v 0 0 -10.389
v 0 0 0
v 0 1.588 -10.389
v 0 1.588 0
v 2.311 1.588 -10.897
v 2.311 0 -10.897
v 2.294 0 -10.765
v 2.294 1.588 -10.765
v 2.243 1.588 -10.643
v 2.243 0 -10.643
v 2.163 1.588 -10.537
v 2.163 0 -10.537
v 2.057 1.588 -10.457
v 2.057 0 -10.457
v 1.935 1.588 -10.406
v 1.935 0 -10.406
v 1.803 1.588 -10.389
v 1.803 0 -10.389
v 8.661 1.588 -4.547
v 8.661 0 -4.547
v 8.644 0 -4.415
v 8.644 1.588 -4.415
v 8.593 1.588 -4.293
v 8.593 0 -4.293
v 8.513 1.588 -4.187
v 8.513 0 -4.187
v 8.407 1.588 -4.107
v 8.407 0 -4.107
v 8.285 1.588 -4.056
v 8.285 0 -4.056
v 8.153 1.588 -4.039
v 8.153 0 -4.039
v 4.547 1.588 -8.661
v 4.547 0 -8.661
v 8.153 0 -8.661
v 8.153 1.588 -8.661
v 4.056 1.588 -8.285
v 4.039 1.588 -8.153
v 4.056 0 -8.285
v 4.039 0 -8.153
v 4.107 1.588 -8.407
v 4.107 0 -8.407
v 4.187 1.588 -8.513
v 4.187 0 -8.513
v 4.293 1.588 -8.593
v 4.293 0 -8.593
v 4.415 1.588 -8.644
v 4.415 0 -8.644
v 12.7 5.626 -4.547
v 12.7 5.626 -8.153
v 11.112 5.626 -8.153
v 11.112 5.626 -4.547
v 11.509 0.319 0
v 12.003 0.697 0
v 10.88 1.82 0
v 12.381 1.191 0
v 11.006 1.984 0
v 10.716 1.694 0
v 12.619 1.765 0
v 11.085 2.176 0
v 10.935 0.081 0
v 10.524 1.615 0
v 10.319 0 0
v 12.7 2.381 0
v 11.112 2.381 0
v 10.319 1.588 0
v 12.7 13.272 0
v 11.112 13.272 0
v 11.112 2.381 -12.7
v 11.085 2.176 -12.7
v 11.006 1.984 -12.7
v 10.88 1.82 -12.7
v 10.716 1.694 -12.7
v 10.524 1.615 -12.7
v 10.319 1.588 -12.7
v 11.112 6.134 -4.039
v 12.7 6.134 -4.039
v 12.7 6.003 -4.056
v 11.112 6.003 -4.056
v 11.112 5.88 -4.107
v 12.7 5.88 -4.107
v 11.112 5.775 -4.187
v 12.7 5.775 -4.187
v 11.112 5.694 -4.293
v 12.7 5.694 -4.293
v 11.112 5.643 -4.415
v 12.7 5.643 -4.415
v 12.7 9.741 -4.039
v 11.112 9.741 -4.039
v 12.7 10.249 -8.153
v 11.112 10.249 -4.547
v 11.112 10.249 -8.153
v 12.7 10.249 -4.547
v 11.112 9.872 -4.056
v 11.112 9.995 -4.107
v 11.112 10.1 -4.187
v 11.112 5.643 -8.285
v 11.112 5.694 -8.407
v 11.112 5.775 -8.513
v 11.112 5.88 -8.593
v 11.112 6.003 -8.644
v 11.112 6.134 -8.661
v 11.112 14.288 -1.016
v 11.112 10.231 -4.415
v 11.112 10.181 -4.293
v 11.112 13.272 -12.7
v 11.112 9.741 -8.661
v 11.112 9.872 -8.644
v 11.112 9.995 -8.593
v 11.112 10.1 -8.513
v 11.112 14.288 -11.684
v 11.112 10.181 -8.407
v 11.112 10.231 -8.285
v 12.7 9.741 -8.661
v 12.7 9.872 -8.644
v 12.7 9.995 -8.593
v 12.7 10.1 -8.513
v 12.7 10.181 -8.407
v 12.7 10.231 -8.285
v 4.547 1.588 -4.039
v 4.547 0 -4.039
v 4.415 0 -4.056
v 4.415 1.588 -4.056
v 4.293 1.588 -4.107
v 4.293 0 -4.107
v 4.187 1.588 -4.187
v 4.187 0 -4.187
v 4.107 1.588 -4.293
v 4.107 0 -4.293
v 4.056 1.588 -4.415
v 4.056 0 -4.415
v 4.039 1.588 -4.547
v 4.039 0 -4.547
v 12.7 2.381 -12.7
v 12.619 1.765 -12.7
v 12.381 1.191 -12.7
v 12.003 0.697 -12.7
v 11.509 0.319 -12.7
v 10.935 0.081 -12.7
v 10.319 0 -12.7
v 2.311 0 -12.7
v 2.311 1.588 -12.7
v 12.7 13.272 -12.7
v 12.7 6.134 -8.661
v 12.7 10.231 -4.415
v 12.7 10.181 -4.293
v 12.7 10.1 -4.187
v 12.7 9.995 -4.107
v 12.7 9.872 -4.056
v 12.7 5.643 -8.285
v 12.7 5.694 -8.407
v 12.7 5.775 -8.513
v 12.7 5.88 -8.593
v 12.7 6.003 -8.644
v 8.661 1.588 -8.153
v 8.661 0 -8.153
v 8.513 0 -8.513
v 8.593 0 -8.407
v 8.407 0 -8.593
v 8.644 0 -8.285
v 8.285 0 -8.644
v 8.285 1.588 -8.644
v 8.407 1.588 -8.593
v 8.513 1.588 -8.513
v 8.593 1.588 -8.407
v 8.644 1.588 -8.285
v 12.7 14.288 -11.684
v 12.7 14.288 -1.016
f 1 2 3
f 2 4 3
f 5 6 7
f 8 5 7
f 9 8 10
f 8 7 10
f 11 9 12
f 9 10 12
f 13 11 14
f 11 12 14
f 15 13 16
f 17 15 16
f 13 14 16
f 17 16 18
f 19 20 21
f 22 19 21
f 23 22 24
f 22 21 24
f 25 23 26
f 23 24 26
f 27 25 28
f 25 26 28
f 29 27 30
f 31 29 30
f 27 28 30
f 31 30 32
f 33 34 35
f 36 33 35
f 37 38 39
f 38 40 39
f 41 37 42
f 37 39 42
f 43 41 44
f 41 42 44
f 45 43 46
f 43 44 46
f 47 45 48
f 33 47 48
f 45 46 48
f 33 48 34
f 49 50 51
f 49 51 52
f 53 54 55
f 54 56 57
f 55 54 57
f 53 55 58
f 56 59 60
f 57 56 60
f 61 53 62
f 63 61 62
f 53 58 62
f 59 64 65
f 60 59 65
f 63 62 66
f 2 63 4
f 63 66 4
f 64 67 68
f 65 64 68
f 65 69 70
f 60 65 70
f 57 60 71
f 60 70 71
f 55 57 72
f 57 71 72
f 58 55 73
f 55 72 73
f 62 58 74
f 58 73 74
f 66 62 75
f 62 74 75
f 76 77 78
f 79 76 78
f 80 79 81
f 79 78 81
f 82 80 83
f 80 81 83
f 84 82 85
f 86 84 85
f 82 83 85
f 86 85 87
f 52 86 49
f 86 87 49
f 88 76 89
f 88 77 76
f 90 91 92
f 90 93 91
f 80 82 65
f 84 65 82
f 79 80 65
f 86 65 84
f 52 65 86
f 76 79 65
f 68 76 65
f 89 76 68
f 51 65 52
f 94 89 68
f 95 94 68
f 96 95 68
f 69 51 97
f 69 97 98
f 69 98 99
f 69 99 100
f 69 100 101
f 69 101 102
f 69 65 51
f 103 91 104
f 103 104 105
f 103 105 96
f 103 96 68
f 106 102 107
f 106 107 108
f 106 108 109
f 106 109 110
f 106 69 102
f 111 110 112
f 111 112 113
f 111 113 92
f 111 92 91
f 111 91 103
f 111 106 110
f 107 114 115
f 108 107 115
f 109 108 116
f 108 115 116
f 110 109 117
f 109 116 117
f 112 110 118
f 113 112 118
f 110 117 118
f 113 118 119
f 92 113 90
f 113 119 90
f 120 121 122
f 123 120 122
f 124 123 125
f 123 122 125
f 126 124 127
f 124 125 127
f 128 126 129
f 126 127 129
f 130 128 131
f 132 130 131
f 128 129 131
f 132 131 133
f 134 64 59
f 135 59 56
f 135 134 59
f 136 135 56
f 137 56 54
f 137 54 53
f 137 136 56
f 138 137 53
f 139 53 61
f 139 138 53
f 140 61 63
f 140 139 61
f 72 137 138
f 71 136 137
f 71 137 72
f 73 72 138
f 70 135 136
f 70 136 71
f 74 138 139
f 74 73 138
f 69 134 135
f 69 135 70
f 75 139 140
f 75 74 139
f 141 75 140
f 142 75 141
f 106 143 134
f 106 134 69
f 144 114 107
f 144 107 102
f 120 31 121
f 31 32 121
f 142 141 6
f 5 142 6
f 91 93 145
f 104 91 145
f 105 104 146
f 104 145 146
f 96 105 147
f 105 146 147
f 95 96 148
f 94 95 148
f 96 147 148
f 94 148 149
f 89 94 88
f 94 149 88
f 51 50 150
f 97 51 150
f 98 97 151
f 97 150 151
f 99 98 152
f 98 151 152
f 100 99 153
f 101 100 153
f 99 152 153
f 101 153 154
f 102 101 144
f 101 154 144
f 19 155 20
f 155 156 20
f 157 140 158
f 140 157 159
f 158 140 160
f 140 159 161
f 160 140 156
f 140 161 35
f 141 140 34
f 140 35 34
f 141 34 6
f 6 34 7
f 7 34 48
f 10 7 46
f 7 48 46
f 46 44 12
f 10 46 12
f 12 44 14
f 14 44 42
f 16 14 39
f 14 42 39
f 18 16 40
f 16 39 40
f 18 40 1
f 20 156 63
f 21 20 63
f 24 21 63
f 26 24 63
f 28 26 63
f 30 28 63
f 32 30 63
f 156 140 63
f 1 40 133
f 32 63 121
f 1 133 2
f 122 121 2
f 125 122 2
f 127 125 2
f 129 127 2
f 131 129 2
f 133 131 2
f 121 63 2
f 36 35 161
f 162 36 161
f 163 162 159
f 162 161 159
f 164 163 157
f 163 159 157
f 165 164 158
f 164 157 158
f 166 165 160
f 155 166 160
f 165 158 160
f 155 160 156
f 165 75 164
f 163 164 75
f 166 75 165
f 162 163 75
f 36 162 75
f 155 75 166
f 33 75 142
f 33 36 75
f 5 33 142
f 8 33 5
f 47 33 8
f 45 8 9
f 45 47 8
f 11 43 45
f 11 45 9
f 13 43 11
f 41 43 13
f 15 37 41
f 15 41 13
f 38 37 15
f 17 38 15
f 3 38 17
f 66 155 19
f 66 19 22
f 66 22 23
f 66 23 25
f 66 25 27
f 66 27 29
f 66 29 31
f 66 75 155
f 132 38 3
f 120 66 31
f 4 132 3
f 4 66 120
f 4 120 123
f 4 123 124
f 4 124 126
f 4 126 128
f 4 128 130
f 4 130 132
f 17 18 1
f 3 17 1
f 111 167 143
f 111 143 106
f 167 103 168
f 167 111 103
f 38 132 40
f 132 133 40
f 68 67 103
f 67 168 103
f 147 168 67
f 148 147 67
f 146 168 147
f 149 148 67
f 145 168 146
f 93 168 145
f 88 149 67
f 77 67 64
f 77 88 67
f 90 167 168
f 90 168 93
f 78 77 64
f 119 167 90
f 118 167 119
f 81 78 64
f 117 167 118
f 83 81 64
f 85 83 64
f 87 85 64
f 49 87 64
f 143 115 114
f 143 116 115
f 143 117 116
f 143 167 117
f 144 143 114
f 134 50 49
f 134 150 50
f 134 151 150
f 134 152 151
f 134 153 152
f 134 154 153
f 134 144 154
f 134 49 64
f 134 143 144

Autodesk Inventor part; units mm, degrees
ref_plane "YZ Plane" through (0, 0, 0) normal (1, 0, 0) x (0, 1, 0)
ref_plane "XZ Plane" through (0, 0, 0) normal (0, 1, 0) x (-1, 0, 0)
sketch "Sketch1" plane through (0, 0, 0) normal (0, 1, 0) x (-1, 0, 0)
  line L0 (-12.7, 0) -> (12.7, 0)
  line L1 (12.7, 0) -> (12.7, -12.7)
  line L2 (12.7, -12.7) -> (-12.7, -12.7)
  line L3 (-12.7, -12.7) -> (-12.7, 0)
  line L4 (12.7, 0) -> (-12.7, -12.7) construction
  point P0 (0, 0)
  point P1 (0, 0)
  dimension "d0" = 25.4
  dimension "d1" = 12.7
extrude "Plate1" add sketch "Sketch1" along normal blind 1.5875
sketch "Sketch2" plane through (11.1125, 0, -12.7) normal (1, 0, 0) x (0, 1, 0)
  line L0 (0, 12.7) -> (0, 0)
  line L1 (0, 0) -> (14.2875, 0)
  line L2 (14.2875, 0) -> (14.2875, 12.7)
  line L3 (14.2875, 12.7) -> (0, 12.7)
edge flange "Flanges" height 12.7 angle 90 thickness 1.5875 bend radius 0.7937 thickness toward (1, 0, 0) relief tear relief width 1.5875 relief depth 0.7937 corner gap 1.5875 corner form 0 edges at (12.7, 1.5875, -6.35) (-12.7, 1.5875, -6.35) wall of the first edge with corners at (11.1125, 0, 0) (11.1125, 0, -12.7) (11.1125, 14.2875, -12.7) (11.1125, 14.2875, 0)
bend "Bend1"
corner "Corner1"
sketch "Sketch3" plane through (12.7, 2.3812, -12.7) normal (1, 0, 0) x (0, 0, -1)
  line L0 (-8.1534, 7.8676) -> (-4.5466, 7.8676)
  line L1 (-4.0386, 7.3596) -> (-4.0386, 3.7528)
  line L2 (-4.5466, 3.2448) -> (-8.1534, 3.2448)
  line L3 (-8.6614, 3.7528) -> (-8.6614, 7.3596)
  arc A0 (-8.1534, 7.8676) -> (-8.6614, 7.3596) centre (-8.1534, 7.3596) ccw
  arc A1 (-4.0386, 7.3596) -> (-4.5466, 7.8676) centre (-4.5466, 7.3596) ccw
  arc A2 (-4.5466, 3.2448) -> (-4.0386, 3.7528) centre (-4.5466, 3.7528) ccw
  arc A3 (-8.6614, 3.7528) -> (-8.1534, 3.2448) centre (-8.1534, 3.7528) ccw
  line L4 (-12.7, 0) -> (-12.7, 11.9062) construction
  line L5 (-12.7, 11.9062) -> (0, 11.9062) construction
  line L6 (-8.1534, 7.3596) -> (-4.5466, 3.7528) construction
  point P0 (-12.7, -2.3813)
  point P1 (-4.0386, 3.2448)
  point P2 (-8.6614, 3.2448)
  point P3 (-6.35, 5.5562)
  dimension "d16" = 4.6228
  dimension "d17" = 0.508
  dimension "d20" = 6.35
  dimension "d21" = 6.35
extrude "Flange Stamp" cut sketch "Sketch3" against normal blind 1.5875
sketch "Sketch7" plane through (12.7, 2.3813, 0) normal (1, 0, 0) x (0, 0, -1)
  arc A0 (4.5466, 7.8676) -> (4.0386, 7.3596) centre (4.5466, 7.3596) ccw construction
  arc A1 (8.1534, 3.2448) -> (8.6614, 3.7528) centre (8.1534, 3.7528) ccw construction
  circle A2 centre (6.35, 5.5563) radius 2.1844
  line L0 (4.5466, 7.3596) -> (8.1534, 3.7528) construction
  point P0 (0, -2.3813)
  dimension "d46" = 4.3688
surface extrude "Flange Circle" sketch "Sketch7" against normal up to surface (1.5875 mm away) shown yes curves A2
ref_plane "Flange Pattern Plane" through (12.7, 7.9375, -4.5466) normal (0, 1, 0) x (1, 0, 0)
sketch "Flange Pattern Sketch" plane through (12.7, 7.9375, -4.5466) normal (0, 1, 0) x (1, 0, 0)
  line L0 (0, 3.6068) -> (0, 0) construction
  line L1 (-30.5786, -4.5466) -> (5.6718, -4.5466) construction
  line L2 (0, 0) -> (-1.5875, 0) construction
  point P0 (-12.7, -4.5466)
  point P1 (0, 1.8034)
  point P2 (0, 14.5034)
  dimension "d43" = 25.4
  dimension "d40" = 12.7
feature "Flange Pattern" [suppressed]
sketch "Sketch8" plane through (0, 0, 0) normal (0, -1, 0) x (1, 0, 0)
  line L0 (10.3187, 0) -> (-10.3187, 0) construction
  line L1 (8.1534, -4.0386) -> (4.5466, -4.0386)
  line L2 (4.0386, -4.5466) -> (4.0386, -8.1534)
  line L3 (4.5466, -8.6614) -> (8.1534, -8.6614)
  line L4 (8.6614, -8.1534) -> (8.6614, -4.5466)
  arc A0 (8.6614, -4.5466) -> (8.1534, -4.0386) centre (8.1534, -4.5466) ccw
  arc A1 (8.1534, -8.6614) -> (8.6614, -8.1534) centre (8.1534, -8.1534) ccw
  arc A2 (4.0386, -8.1534) -> (4.5466, -8.6614) centre (4.5466, -8.1534) ccw
  arc A3 (4.5466, -4.0386) -> (4.0386, -4.5466) centre (4.5466, -4.5466) ccw
  line L5 (8.1534, -4.5466) -> (4.5466, -8.1534) construction
  line L6 (12.7, 0) -> (12.7, -12.7) construction
  point P0 (0, 0)
  point P1 (4.0386, -8.6614)
  point P2 (8.6614, -8.6614)
  point P3 (6.35, -6.35)
  dimension "d49" = 4.6228
  dimension "d50" = 0.508
  dimension "d51" = 6.35
  dimension "d52" = 6.35
extrude "Body Stamp" cut sketch "Sketch8" against normal blind 1.5875
sketch "Sketch9" plane through (0, 0, 0) normal (0, -1, 0) x (1, 0, 0)
  arc A0 (8.6614, -4.5466) -> (8.1534, -4.0386) centre (8.1534, -4.5466) ccw construction
  arc A1 (4.0386, -8.1534) -> (4.5466, -8.6614) centre (4.5466, -8.1534) ccw construction
  line L0 (8.1534, -4.5466) -> (4.5466, -8.1534) construction
  circle A2 centre (6.35, -6.35) radius 2.1844
  point P0 (0, 0)
  dimension "d55" = 4.3688
surface extrude "Body Circle" sketch "Sketch9" against normal up to surface (1.5875 mm away) shown yes curves A2
sketch "Body Pattern Sketch" plane through (0, 0, 0) normal (0, -1, 0) x (1, 0, 0)
  line L0 (10.3187, 0) -> (-10.3187, 0) construction
  line L1 (12.7, 0) -> (12.7, -12.7) construction
  point P0 (0, 0)
  point P1 (6.35, -6.35)
  point P2 (6.35, -19.05)
  dimension "d62" = 12.7
  dimension "d65" = 12.7
  dimension "d58" = 6.35
  dimension "d99" = 6.35
feature "Body Pattern" [suppressed]
sketch "Sketch15" plane through (0, 0, 0) normal (0, -1, 0) x (1, 0, 0)
  line L0 (10.3187, 0) -> (-10.3187, 0) construction
  line L1 (1.8034, -10.3886) -> (-1.8034, -10.3886)
  line L2 (-2.3114, -10.8966) -> (-2.3114, -14.5034)
  line L3 (-1.8034, -15.0114) -> (1.8034, -15.0114)
  line L4 (2.3114, -14.5034) -> (2.3114, -10.8966)
  arc A0 (2.3114, -10.8966) -> (1.8034, -10.3886) centre (1.8034, -10.8966) ccw
  arc A1 (1.8034, -15.0114) -> (2.3114, -14.5034) centre (1.8034, -14.5034) ccw
  arc A2 (-1.8034, -10.3886) -> (-2.3114, -10.8966) centre (-1.8034, -10.8966) ccw
  arc A3 (-2.3114, -14.5034) -> (-1.8034, -15.0114) centre (-1.8034, -14.5034) ccw
  line L5 (1.8034, -10.8966) -> (-1.8034, -14.5034) construction
  line L6 (12.7, 0) -> (12.7, -12.7) construction
  point P0 (0, 0)
  point P1 (-2.3114, -15.0114)
  point P2 (2.3114, -15.0114)
  point P3 (0, -12.7)
  dimension "d106" = 4.6228
  dimension "d107" = 0.508
  dimension "d108" = 12.7
  dimension "d109" = 12.7
extrude "Center Stamp" cut sketch "Sketch15" against normal blind 1.5875
extrude_surface "Center Circle" [suppressed]
pattern_linear "Center Pattern" [suppressed]
sketch "Arc Length" plane through (11.1125, 2.3813, 0) normal (0, 0, 1) x (1, 0, 0)
  line L0 (0, 0) -> (1.5875, 0) construction
  arc A0 (-0.7937, -0.7938) -> (0, 0) centre (-0.7937, 0) ccw construction
  line L1 (-0.7937, -2.3813) -> (-0.7937, -0.7938) construction
  arc A1 (-0.7937, -2.3813) -> (1.5875, 0) centre (-0.7937, 0) ccw construction
  point P0 (-11.1125, -2.3813)
  dimension "d85" = 3.7405
  dimension "d92" = 1.2468
feature "Notch" [suppressed]
mirror "Notch Mirror" [suppressed]
pattern_linear "Notch Pattern" [suppressed]
chamfer "End Chamfer" distance 1.016 angle 45 4 edges at (-11.9062, 14.2875, -12.7) (11.9063, 14.2875, -12.7) (-11.9062, 14.2875, 0) (11.9062, 14.2875, 0)
sketch "Sketch14" plane through (-12.7, 2.3813, 431.8) normal (1, 0, 0) x (0, 0, -1)
  line L0 (431.8, 11.9063) -> (444.5, 11.9063) construction
  line L1 (431.8, 0) -> (431.8, 11.9063) construction
  line L2 (431.8, -2.3813) -> (444.5, -2.3813) construction
  line L3 (431.8, 11.9063) -> (444.5, 11.9063)
  line L4 (444.5, 11.9063) -> (444.5, -2.3813)
  line L5 (444.5, -2.3813) -> (431.8, -2.3813)
  line L6 (431.8, -2.3813) -> (431.8, 11.9063)
  point P0 (62.4078, 11.9062)
  point P1 (432.816, 11.9063)
  point P2 (431.8, 10.8903)
  point P3 (431.8, -2.3812)
  point P4 (382.0521, -1.9844)
  point P5 (443.484, 11.9063)
  point P6 (254.9398, 11.9062)
  point P7 (316.4078, 11.9062)
extrude "Half Cut" cut sketch "Sketch14" along normal blind 12.7
sketch "Sketch13" plane through (12.7, 14.2875, 0) normal (1, 0, 0) x (0, 0, -1)
  line L0 (0, 0) -> (12.7, 0) construction
  line L1 (62.4078, 0) -> (63.4238, -1.016)
  line L2 (63.4238, -1.016) -> (64.4398, 0)
  line L3 (62.4078, 0) -> (64.4398, 0)
  line L4 (12.7, -11.9062) -> (0, -11.9062) construction
  line L5 (63.4238, -10.8903) -> (61.161, -13.1531)
  line L6 (61.161, -13.1531) -> (63.4238, -15.4159)
  line L7 (63.4238, -15.4159) -> (65.6866, -13.1531)
  line L8 (65.6866, -13.1531) -> (63.4238, -10.8903)
  line L9 (63.4238, -10.8903) -> (63.4238, -15.4159) construction
  line L10 (63.4238, -1.016) -> (63.4238, -10.8903) construction
  line L11 (0, -11.9062) -> (12.7, -11.9062) construction
  point P0 (0, -14.2875)
  dimension "d86" = 4.5256
  dimension "d88" = 1.016
  dimension "d91" = 1.016
  dimension "d102" = 63.4238
sketch "Sketch16" plane through (0, 0, 0) normal (0, -1, 0) x (1, 0, 0)
  circle A0 centre (0, -12.7) radius 2.1844
  line L0 (10.3187, 0) -> (-10.3187, 0) construction
  line L1 (12.7, 0) -> (12.7, -12.7) construction
  point P0 (0, 0)
  dimension "d112" = 4.3688
  dimension "d118" = 12.7
  dimension "d119" = 12.7
equation "\"d18\" = Thickness"
equation "\"d53\" = Thickness"
equation "\"d89\" = Thickness"
equation "\"d1\" = 12.7 * Length"
equation "\"d2\" = Thickness"
equation "\"d3\" = BendReliefWidth"
equation "\"d4\" = BendReliefDepth"
equation "\"d5\" = MinimumRemnant"
equation "\"d6\" = TransitionRadius"
equation "\"d10\" = CornerReliefSize"
equation "\"d11\" = GapSize"
equation "\"d12\" = JacobiRadiusSize"
equation "\"BendRadius\" = Thickness"
equation "\"BendReliefWidth\" = Thickness"
equation "\"BendReliefDepth\" = 0.5 * Thickness"
equation "\"CornerReliefSize\" = 4 * Thickness"
equation "\"MinimumRemnant\" = 2 * Thickness"
equation "\"TransitionRadius\" = BendRadius"
equation "\"JacobiRadiusSize\" = BendRadius"
equation "\"GapSize\" = Thickness"
equation "\"Thickness\" = 1.5875"
equation "\"Length\" = 1"
properties part number "Alu C 1x2x1x35"
